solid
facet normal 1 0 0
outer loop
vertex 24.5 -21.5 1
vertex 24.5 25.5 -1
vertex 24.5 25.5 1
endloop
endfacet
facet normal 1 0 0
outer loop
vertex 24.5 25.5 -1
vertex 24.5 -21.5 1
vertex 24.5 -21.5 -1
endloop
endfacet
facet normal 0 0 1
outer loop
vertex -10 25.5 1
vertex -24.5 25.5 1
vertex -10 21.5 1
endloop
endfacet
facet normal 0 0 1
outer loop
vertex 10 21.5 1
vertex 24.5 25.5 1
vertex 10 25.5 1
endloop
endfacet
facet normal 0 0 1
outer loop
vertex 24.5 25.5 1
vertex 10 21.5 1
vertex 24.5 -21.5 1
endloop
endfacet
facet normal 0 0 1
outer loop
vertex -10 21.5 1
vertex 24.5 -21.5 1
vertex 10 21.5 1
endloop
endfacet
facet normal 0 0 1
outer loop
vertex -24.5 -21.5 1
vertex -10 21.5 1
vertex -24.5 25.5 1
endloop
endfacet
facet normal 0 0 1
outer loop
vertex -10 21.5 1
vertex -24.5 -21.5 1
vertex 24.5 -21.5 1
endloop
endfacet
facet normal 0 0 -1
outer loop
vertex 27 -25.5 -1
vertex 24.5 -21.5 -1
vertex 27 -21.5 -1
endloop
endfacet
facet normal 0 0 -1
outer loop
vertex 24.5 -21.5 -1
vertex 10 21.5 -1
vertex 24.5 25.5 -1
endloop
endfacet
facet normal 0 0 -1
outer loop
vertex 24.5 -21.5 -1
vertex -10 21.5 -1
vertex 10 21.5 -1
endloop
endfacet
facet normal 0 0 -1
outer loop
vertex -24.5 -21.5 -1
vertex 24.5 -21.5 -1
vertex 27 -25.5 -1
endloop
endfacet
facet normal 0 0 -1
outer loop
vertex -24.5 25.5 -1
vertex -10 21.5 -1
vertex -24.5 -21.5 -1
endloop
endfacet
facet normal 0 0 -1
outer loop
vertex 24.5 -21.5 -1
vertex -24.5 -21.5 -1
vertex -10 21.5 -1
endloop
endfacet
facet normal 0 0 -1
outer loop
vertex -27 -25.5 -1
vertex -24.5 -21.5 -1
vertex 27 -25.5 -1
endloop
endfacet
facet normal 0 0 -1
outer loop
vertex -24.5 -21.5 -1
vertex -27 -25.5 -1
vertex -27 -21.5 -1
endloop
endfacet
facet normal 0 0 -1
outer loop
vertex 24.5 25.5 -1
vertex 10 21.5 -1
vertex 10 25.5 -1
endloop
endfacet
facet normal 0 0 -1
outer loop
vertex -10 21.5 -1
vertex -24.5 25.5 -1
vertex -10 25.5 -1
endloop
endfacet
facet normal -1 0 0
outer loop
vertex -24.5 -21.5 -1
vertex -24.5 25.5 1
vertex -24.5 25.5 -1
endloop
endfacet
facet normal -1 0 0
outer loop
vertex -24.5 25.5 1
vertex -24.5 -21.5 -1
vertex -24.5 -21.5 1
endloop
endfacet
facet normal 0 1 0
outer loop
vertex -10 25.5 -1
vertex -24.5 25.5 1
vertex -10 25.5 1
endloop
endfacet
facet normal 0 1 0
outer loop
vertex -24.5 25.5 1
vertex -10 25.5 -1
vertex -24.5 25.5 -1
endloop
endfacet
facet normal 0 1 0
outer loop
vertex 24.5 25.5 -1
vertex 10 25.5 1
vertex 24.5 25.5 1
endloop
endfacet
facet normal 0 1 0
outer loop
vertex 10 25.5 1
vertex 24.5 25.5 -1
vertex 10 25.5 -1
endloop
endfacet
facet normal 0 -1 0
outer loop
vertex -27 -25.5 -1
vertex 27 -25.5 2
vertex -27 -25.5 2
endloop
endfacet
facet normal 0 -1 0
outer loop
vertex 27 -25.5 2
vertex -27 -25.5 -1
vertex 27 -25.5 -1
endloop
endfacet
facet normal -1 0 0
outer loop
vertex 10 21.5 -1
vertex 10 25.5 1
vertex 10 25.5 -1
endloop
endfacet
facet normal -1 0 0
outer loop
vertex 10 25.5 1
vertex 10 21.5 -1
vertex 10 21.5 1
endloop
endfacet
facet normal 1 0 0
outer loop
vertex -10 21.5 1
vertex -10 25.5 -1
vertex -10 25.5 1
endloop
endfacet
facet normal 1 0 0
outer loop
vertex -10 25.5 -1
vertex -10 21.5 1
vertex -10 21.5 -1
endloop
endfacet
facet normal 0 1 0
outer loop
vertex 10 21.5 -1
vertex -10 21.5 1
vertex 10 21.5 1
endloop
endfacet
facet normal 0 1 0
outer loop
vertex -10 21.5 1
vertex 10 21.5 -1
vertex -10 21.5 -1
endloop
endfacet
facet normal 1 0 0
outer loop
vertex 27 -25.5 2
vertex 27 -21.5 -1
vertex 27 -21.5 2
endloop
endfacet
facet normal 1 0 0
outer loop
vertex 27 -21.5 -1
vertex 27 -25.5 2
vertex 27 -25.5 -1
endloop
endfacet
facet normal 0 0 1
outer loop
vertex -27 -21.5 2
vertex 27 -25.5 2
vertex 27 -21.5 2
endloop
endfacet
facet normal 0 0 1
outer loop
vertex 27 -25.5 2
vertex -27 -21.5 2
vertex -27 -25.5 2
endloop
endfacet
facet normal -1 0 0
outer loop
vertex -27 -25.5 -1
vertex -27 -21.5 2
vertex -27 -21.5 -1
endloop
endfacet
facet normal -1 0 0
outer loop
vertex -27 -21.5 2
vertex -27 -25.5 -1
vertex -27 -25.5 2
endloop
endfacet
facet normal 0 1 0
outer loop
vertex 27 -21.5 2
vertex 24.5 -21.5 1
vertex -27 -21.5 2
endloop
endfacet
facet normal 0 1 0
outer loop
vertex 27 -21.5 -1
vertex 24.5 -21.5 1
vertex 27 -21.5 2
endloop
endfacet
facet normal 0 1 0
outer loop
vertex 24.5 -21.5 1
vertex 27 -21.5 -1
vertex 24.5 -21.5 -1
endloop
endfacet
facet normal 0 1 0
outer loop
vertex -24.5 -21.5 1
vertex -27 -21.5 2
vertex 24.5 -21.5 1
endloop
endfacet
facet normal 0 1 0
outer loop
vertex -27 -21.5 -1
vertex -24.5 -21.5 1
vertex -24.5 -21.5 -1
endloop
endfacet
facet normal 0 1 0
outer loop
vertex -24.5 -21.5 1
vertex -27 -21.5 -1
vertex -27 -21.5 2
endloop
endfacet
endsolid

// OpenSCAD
holder_height = 50;
holder_width = 54;
holder_wall_thickness = 2;

length = holder_height+1;
width = holder_width-(2*holder_wall_thickness)-1;

union(){
    difference(){
        cube([width, length, 2], center=true);
        translate([0,(length/2)-2,0])cube([20, 4, 2], center=true);
    }
    translate([0, -((length/2)-2), .5])cube([holder_width, 4, 3], center=true);
}
